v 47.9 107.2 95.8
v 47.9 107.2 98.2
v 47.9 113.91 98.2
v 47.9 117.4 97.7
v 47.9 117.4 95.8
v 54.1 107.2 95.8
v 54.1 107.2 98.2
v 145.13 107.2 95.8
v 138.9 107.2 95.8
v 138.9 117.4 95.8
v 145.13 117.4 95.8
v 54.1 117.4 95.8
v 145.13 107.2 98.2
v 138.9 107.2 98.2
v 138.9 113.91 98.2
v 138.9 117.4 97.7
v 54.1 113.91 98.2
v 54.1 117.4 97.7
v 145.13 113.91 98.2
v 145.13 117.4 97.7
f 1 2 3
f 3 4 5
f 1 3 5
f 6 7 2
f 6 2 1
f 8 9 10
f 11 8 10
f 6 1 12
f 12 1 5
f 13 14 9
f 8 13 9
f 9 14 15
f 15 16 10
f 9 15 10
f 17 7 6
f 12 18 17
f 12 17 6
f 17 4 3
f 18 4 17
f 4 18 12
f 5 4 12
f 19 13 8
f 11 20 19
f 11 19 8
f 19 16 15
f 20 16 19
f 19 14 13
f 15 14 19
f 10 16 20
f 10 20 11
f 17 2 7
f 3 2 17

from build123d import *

# Parameters (mm, degrees)
BOX085017_W                    = 2.4
BOX085017_H                    = 10.2
BOX085017_DEPTH                = 6.23
BOX085014_W                    = 2.4
BOX085014_H                    = 10.2
BOX085014_DEPTH                = 6.2
CHAMFER011006003017066_1_SIZE2 = 0.5
CHAMFER011006003017066_1_SIZE  = 3.49
CHAMFER011006003017066_2_SIZE2 = 0.5
CHAMFER011006003017066_2_SIZE  = 3.49


with BuildPart() as cube105:
    # Box085017 → Box085017 (new body)
    with BuildSketch(Plane(origin=(138.9, 107.2, 98.2), x_dir=(0, 0, -1), z_dir=(1, 0, 0))):
        with Locations((1.2, 5.1)):
            Rectangle(BOX085017_W, BOX085017_H)
    extrude(amount=BOX085017_DEPTH)


with BuildPart() as top_tab_holes_old:
    # Box085014 → Box085014 (new body)
    with BuildSketch(Plane(origin=(47.9, 107.2, 98.2), x_dir=(0, 0, -1), z_dir=(1, 0, 0))):
        with Locations((1.2, 5.1)):
            Rectangle(BOX085014_W, BOX085014_H)
    extrude(amount=BOX085014_DEPTH)

    # Fusion004008002002002001007002002026012005: union Cube105
    add(cube105.part)

    # Chamfer011006003017066 1
    chamfer011006003017066_1_edges = [top_tab_holes_old.edges().sort_by_distance(p)[0] for p in [
        (142.015, 117.4, 98.2),
    ]]
    chamfer011006003017066_1_side = top_tab_holes_old.faces().sort_by_distance((142.015, 112.3, 98.2))[0]
    chamfer(chamfer011006003017066_1_edges, length=CHAMFER011006003017066_1_SIZE, length2=CHAMFER011006003017066_1_SIZE2, reference=chamfer011006003017066_1_side)

    # Chamfer011006003017066 2
    chamfer011006003017066_2_edges = [top_tab_holes_old.edges().sort_by_distance(p)[0] for p in [
        (51, 117.4, 98.2),
    ]]
    chamfer011006003017066_2_side = top_tab_holes_old.faces().sort_by_distance((51, 112.3, 98.2))[0]
    chamfer(chamfer011006003017066_2_edges, length=CHAMFER011006003017066_2_SIZE, length2=CHAMFER011006003017066_2_SIZE2, reference=chamfer011006003017066_2_side)


solid = top_tab_holes_old.part
